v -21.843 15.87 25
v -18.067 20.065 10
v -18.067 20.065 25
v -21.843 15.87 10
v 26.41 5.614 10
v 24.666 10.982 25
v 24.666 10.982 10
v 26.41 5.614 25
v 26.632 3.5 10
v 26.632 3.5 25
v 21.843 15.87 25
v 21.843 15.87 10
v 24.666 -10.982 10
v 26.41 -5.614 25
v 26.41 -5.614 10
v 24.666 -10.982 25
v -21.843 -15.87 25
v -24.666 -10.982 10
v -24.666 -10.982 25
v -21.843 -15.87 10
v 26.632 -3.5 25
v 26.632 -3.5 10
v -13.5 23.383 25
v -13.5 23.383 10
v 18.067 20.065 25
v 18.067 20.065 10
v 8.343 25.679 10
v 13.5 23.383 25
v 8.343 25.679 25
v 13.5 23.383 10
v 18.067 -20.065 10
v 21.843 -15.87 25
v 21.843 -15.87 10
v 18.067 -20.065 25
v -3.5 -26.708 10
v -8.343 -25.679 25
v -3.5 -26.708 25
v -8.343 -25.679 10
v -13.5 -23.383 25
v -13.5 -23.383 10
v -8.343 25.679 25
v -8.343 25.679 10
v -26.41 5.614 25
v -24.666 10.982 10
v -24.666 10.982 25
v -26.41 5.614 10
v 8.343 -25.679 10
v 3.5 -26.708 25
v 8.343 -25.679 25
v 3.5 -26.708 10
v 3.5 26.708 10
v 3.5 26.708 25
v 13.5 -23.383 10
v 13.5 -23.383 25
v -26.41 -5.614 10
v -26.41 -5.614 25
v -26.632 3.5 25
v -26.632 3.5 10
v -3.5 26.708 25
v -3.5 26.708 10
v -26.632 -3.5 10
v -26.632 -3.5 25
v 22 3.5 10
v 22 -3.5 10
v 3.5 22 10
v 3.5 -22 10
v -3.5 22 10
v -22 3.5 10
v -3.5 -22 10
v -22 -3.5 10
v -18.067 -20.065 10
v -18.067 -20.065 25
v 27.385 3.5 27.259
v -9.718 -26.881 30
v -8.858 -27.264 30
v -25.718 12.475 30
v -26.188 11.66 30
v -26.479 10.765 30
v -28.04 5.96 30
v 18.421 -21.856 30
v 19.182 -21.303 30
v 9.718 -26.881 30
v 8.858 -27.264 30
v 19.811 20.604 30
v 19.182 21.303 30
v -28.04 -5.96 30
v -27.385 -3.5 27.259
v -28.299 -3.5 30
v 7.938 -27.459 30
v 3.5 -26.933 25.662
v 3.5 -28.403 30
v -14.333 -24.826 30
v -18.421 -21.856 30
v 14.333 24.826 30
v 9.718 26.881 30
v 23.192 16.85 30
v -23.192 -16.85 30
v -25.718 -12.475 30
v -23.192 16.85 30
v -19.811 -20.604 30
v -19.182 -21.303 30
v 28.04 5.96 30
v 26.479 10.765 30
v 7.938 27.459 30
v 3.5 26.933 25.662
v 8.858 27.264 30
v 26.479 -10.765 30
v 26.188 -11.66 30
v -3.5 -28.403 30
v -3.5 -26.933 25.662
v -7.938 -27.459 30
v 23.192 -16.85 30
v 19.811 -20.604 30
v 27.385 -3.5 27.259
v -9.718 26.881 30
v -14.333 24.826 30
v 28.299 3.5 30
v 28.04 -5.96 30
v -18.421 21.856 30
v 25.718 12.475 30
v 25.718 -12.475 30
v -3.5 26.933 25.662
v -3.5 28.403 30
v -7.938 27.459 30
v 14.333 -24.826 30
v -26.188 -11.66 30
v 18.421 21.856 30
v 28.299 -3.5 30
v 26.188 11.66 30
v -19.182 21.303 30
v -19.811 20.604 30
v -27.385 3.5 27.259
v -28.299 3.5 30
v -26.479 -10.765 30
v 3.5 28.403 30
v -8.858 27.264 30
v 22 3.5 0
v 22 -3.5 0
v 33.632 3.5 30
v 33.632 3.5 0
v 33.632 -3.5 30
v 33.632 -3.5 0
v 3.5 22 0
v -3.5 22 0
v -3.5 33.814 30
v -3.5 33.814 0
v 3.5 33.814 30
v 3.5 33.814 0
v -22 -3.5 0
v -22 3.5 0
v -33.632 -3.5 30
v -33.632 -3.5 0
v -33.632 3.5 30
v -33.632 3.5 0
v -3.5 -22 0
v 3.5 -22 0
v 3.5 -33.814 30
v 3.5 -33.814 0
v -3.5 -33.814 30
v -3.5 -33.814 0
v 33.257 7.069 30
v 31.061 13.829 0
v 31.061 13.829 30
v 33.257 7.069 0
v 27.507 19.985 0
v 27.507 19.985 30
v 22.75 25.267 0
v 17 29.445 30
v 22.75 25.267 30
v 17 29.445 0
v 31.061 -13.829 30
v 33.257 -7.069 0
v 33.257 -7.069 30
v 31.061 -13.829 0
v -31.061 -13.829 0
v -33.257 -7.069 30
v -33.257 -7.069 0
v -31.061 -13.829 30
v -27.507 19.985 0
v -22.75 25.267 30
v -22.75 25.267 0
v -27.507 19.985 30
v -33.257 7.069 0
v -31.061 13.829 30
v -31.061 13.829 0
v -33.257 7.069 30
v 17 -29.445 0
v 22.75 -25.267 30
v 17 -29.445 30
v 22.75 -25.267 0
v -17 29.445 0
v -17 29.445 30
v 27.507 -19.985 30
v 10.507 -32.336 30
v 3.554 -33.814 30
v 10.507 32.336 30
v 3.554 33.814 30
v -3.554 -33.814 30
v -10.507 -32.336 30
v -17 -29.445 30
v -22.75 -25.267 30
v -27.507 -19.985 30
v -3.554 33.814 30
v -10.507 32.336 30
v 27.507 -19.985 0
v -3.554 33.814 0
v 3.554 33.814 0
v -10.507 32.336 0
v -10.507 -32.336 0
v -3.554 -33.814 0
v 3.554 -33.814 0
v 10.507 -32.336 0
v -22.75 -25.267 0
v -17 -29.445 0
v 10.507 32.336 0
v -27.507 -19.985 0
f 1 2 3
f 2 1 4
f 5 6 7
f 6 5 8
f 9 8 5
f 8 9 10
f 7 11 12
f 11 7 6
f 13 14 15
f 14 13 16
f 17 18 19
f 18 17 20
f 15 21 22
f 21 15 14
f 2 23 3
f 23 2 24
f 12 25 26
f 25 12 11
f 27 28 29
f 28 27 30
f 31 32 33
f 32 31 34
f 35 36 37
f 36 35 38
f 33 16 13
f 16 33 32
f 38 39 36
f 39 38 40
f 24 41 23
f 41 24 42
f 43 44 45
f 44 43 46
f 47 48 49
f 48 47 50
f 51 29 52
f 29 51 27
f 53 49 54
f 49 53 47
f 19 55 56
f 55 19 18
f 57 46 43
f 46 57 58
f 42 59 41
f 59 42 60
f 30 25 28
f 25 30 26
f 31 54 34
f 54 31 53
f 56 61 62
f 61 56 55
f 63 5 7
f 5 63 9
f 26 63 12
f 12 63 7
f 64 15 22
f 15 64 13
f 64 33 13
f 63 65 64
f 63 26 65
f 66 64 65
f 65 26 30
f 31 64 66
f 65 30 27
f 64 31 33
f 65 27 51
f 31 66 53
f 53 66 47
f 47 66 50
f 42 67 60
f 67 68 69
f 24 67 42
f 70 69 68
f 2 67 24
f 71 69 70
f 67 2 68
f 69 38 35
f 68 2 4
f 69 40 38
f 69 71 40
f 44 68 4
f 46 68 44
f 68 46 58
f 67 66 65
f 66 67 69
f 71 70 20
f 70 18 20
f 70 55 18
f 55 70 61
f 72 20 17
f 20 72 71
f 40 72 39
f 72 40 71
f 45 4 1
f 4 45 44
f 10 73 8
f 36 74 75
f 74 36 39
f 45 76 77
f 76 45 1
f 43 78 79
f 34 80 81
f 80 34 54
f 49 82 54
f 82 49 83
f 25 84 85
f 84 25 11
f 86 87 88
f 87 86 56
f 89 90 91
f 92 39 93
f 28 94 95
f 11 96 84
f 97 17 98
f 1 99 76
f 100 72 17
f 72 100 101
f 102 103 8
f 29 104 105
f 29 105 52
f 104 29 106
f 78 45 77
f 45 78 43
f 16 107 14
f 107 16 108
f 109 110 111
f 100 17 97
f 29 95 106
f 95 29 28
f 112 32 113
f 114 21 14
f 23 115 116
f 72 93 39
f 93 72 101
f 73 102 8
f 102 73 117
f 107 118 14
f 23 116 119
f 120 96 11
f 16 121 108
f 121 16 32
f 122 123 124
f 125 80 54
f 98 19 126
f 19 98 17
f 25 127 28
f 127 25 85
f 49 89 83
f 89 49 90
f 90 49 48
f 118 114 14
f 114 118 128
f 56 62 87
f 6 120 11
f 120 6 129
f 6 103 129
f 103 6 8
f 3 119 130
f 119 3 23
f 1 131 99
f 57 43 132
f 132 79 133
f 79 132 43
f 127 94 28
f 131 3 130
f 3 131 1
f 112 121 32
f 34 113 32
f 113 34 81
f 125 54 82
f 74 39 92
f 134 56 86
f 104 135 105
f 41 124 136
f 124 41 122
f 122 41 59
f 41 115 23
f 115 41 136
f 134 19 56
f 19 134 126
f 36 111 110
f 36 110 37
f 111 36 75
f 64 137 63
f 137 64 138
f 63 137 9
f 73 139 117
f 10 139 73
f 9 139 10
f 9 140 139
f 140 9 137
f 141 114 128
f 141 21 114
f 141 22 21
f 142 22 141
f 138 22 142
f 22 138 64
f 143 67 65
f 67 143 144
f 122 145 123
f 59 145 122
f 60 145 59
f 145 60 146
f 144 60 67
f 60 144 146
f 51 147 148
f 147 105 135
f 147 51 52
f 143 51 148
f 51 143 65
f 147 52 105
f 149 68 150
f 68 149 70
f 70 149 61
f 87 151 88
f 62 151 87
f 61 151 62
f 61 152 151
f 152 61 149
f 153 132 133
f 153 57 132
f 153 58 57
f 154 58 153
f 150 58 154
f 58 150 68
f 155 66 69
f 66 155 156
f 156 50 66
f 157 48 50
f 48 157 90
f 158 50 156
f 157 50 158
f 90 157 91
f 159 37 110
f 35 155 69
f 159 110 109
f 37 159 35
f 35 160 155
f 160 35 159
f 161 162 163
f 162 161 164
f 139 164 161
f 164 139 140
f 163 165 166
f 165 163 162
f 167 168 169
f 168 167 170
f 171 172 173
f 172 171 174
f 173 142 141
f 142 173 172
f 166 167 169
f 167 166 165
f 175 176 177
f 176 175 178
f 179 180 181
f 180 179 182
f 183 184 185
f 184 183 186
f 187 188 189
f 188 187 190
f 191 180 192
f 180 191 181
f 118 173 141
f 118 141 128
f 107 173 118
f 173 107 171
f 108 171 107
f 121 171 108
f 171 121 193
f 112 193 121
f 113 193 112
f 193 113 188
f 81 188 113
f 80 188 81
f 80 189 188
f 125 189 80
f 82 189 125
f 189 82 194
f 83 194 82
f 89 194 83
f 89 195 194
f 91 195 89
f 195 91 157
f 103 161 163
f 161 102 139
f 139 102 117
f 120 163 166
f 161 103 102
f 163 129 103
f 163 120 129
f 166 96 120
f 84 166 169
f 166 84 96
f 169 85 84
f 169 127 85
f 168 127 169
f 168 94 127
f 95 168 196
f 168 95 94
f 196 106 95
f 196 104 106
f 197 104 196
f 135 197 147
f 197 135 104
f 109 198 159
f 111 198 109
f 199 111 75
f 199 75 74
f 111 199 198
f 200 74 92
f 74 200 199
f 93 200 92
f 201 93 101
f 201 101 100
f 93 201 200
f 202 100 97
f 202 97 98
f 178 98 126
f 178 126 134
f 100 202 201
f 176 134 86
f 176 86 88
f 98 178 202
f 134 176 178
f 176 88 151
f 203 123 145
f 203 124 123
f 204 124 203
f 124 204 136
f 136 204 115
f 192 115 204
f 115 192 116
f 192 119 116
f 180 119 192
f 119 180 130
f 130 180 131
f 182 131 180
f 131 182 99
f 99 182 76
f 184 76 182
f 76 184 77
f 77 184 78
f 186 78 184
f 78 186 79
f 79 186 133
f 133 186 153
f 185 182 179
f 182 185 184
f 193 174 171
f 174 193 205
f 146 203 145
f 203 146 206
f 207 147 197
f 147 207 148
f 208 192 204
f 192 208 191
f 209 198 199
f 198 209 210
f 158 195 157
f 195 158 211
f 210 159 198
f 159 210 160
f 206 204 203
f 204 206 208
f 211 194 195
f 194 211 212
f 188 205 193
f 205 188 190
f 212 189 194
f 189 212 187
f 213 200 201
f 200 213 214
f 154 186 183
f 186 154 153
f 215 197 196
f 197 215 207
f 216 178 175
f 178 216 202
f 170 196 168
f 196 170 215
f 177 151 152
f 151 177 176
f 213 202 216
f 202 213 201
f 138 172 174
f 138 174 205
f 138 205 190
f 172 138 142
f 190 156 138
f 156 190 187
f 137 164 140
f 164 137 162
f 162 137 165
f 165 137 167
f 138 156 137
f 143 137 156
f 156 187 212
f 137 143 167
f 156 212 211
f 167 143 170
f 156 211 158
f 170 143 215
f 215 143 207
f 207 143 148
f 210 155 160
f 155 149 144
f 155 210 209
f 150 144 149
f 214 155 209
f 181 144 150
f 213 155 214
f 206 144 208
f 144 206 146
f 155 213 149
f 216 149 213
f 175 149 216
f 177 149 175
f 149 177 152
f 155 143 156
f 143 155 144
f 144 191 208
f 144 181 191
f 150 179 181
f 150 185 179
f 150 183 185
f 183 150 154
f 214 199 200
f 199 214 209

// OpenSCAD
// Parameters of the rocket
tube_diameter = 54;
fin_thickness = 5;
num_fins = 4;

// Basic dimensions
claw_depth = 20;
base_depth = 10;
lip_width = 7;

// Bevel around the lip to allow easy fitting
bevel_depth = 5;
bevel_expansion = 2;

// Notches
notch_depth = 5;
notch_fin_sep = 1;

// Don't change
notch_height = claw_depth + base_depth + 2;
notch_width = fin_thickness + (notch_fin_sep * 2);

difference() {
    // Base cylinder
    cylinder(h = base_depth + claw_depth, r = (tube_diameter / 2) + lip_width);

    // Hole
    union () {
        translate([0, 0, base_depth])
            cylinder(h = claw_depth + 1, r = tube_diameter / 2);

        translate([0, 0, base_depth + (claw_depth - bevel_depth)])
            cylinder(
                h = bevel_depth + 1,
                r1 = tube_diameter / 2,
                r2 = (tube_diameter / 2) + bevel_expansion
            );
    };

    // Cutouts
    for (i = [0:num_fins - 1]) {
        rotate([0, 0, (360 / num_fins) * i])
        translate([
            (tube_diameter / 2) - notch_depth,
            -(notch_width / 2),
            -1
        ])
        cube(
            [
                notch_depth + lip_width,
                notch_width,
                notch_height
            ]
        );
    }
};
